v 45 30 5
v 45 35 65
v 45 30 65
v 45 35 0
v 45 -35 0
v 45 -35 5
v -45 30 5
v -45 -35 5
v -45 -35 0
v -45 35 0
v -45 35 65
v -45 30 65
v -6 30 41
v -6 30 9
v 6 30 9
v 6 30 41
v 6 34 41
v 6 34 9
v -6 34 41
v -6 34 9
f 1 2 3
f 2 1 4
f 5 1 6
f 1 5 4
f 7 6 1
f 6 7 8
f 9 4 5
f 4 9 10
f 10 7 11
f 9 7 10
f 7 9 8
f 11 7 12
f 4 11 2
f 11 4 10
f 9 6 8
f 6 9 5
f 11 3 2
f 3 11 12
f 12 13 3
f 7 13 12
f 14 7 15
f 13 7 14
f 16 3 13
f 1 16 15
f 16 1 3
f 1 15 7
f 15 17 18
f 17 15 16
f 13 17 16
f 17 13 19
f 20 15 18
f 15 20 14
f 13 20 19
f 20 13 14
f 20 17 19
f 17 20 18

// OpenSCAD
// Generated with SolidPython2 for OpenSCAD task-021
$fn = 64;

difference() {
	union() {
		translate(v = [-45.0, -35.0, 0]) {
			cube(size = [90, 70, 5]);
		}
		translate(v = [-45, 30, 5]) {
			cube(size = [90, 5, 60]);
		}
	}
	translate(v = [0, 30, 25]) {
		cube(center = true, size = [12, 8, 32]);
	}
}
